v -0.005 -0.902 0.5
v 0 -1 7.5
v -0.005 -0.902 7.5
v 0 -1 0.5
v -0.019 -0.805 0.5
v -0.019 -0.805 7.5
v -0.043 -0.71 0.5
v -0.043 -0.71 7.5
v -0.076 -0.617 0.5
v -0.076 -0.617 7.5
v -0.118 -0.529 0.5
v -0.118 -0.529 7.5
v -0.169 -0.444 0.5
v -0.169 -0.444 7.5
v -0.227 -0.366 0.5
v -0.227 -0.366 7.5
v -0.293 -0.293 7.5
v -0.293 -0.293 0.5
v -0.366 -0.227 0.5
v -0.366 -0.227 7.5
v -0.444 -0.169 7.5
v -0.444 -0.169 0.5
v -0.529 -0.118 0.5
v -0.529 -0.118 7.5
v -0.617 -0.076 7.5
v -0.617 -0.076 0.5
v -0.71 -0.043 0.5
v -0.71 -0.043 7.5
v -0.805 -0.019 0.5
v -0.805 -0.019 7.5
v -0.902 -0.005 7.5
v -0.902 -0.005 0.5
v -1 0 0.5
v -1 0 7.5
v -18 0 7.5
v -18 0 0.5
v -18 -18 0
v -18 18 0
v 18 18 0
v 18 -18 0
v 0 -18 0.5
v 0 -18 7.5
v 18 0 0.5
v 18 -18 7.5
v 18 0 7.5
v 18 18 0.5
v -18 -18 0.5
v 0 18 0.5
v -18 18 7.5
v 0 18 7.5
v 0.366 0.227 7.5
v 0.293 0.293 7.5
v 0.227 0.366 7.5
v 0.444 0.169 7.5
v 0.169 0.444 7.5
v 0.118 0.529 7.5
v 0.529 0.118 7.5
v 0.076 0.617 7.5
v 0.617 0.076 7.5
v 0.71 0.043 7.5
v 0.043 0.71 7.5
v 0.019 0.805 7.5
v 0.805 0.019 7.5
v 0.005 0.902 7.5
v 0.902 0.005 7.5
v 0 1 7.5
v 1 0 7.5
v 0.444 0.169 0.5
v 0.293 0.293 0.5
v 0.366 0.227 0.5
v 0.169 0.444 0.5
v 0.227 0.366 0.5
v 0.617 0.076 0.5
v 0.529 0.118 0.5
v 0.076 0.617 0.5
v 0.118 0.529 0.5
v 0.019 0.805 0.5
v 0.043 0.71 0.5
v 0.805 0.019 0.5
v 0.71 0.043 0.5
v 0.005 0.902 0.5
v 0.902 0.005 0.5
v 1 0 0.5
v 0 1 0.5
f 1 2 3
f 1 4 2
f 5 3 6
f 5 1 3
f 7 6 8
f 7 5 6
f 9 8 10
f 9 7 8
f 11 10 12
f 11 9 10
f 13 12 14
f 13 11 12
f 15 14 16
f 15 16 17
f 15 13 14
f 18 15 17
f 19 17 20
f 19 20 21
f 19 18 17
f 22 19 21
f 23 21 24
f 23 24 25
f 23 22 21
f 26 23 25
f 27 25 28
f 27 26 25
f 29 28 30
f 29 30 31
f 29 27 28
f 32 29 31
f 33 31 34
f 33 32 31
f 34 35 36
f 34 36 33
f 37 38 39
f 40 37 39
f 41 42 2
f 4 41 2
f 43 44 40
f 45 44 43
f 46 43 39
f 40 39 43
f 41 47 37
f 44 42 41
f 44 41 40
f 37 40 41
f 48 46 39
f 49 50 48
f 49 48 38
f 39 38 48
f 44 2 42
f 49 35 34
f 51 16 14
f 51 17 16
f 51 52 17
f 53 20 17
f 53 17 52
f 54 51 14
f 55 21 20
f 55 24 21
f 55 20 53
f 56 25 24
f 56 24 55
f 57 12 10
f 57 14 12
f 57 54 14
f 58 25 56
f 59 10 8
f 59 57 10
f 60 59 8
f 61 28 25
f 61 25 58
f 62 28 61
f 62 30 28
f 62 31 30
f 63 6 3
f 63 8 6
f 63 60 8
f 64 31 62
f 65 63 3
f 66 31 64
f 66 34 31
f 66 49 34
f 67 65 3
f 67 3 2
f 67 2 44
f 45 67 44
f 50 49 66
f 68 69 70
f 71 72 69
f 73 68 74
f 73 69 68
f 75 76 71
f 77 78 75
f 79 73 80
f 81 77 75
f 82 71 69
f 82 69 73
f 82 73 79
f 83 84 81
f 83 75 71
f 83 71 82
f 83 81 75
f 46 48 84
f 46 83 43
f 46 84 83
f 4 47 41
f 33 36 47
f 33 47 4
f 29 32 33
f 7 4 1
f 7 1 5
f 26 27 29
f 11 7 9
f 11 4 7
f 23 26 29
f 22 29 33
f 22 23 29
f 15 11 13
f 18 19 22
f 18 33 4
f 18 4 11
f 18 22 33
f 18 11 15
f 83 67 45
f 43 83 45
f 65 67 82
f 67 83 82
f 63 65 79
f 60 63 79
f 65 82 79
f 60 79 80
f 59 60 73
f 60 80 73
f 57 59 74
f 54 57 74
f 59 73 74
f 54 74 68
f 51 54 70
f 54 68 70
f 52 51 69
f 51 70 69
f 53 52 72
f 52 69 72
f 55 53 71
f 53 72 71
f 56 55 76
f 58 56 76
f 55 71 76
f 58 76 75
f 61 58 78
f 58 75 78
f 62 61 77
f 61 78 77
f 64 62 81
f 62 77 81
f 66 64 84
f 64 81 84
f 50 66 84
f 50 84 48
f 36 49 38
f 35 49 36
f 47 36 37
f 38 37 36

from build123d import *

# Parameters (mm, degrees)
F1_W     = 18
F1_H     = 18
F2_DEPTH = 7.5
F3_DEPTH = 7
F4_R     = 1
F5_DEPTH = 7
F6_R     = 1


with BuildPart() as f2:
    # F1 (on offset) → F2 (new body)
    with BuildSketch(Plane.XY.offset(7.5)):
        with Locations((9, -9)):
            Rectangle(F1_W, F1_H)
        with Locations((-9, 9)):
            Rectangle(F1_W, F1_H)
        with Locations((9, 9)):
            Rectangle(F1_W, F1_H)
        with Locations((-9, -9)):
            Rectangle(F1_W, F1_H)
    extrude(amount=-F2_DEPTH)

    # F1 (on offset) → F3 (cut)
    with BuildSketch(Plane.XY.offset(7.5)):
        with Locations((9, 9)):
            Rectangle(F1_W, F1_H)
    extrude(amount=-F3_DEPTH, mode=Mode.SUBTRACT)

    # F4
    f4_edges = [f2.edges().sort_by_distance(p)[0] for p in [
        (0, 0, 4),
    ]]
    fillet(f4_edges, radius=F4_R)

    # F1 (on offset) → F5 (cut)
    with BuildSketch(Plane.XY.offset(7.5)):
        with Locations((-9, -9)):
            Rectangle(F1_W, F1_H)
    extrude(amount=-F5_DEPTH, mode=Mode.SUBTRACT)

    # F6
    f6_edges = [f2.edges().sort_by_distance(p)[0] for p in [
        (0, 0, 4),
    ]]
    fillet(f6_edges, radius=F6_R)


solid = f2.part
